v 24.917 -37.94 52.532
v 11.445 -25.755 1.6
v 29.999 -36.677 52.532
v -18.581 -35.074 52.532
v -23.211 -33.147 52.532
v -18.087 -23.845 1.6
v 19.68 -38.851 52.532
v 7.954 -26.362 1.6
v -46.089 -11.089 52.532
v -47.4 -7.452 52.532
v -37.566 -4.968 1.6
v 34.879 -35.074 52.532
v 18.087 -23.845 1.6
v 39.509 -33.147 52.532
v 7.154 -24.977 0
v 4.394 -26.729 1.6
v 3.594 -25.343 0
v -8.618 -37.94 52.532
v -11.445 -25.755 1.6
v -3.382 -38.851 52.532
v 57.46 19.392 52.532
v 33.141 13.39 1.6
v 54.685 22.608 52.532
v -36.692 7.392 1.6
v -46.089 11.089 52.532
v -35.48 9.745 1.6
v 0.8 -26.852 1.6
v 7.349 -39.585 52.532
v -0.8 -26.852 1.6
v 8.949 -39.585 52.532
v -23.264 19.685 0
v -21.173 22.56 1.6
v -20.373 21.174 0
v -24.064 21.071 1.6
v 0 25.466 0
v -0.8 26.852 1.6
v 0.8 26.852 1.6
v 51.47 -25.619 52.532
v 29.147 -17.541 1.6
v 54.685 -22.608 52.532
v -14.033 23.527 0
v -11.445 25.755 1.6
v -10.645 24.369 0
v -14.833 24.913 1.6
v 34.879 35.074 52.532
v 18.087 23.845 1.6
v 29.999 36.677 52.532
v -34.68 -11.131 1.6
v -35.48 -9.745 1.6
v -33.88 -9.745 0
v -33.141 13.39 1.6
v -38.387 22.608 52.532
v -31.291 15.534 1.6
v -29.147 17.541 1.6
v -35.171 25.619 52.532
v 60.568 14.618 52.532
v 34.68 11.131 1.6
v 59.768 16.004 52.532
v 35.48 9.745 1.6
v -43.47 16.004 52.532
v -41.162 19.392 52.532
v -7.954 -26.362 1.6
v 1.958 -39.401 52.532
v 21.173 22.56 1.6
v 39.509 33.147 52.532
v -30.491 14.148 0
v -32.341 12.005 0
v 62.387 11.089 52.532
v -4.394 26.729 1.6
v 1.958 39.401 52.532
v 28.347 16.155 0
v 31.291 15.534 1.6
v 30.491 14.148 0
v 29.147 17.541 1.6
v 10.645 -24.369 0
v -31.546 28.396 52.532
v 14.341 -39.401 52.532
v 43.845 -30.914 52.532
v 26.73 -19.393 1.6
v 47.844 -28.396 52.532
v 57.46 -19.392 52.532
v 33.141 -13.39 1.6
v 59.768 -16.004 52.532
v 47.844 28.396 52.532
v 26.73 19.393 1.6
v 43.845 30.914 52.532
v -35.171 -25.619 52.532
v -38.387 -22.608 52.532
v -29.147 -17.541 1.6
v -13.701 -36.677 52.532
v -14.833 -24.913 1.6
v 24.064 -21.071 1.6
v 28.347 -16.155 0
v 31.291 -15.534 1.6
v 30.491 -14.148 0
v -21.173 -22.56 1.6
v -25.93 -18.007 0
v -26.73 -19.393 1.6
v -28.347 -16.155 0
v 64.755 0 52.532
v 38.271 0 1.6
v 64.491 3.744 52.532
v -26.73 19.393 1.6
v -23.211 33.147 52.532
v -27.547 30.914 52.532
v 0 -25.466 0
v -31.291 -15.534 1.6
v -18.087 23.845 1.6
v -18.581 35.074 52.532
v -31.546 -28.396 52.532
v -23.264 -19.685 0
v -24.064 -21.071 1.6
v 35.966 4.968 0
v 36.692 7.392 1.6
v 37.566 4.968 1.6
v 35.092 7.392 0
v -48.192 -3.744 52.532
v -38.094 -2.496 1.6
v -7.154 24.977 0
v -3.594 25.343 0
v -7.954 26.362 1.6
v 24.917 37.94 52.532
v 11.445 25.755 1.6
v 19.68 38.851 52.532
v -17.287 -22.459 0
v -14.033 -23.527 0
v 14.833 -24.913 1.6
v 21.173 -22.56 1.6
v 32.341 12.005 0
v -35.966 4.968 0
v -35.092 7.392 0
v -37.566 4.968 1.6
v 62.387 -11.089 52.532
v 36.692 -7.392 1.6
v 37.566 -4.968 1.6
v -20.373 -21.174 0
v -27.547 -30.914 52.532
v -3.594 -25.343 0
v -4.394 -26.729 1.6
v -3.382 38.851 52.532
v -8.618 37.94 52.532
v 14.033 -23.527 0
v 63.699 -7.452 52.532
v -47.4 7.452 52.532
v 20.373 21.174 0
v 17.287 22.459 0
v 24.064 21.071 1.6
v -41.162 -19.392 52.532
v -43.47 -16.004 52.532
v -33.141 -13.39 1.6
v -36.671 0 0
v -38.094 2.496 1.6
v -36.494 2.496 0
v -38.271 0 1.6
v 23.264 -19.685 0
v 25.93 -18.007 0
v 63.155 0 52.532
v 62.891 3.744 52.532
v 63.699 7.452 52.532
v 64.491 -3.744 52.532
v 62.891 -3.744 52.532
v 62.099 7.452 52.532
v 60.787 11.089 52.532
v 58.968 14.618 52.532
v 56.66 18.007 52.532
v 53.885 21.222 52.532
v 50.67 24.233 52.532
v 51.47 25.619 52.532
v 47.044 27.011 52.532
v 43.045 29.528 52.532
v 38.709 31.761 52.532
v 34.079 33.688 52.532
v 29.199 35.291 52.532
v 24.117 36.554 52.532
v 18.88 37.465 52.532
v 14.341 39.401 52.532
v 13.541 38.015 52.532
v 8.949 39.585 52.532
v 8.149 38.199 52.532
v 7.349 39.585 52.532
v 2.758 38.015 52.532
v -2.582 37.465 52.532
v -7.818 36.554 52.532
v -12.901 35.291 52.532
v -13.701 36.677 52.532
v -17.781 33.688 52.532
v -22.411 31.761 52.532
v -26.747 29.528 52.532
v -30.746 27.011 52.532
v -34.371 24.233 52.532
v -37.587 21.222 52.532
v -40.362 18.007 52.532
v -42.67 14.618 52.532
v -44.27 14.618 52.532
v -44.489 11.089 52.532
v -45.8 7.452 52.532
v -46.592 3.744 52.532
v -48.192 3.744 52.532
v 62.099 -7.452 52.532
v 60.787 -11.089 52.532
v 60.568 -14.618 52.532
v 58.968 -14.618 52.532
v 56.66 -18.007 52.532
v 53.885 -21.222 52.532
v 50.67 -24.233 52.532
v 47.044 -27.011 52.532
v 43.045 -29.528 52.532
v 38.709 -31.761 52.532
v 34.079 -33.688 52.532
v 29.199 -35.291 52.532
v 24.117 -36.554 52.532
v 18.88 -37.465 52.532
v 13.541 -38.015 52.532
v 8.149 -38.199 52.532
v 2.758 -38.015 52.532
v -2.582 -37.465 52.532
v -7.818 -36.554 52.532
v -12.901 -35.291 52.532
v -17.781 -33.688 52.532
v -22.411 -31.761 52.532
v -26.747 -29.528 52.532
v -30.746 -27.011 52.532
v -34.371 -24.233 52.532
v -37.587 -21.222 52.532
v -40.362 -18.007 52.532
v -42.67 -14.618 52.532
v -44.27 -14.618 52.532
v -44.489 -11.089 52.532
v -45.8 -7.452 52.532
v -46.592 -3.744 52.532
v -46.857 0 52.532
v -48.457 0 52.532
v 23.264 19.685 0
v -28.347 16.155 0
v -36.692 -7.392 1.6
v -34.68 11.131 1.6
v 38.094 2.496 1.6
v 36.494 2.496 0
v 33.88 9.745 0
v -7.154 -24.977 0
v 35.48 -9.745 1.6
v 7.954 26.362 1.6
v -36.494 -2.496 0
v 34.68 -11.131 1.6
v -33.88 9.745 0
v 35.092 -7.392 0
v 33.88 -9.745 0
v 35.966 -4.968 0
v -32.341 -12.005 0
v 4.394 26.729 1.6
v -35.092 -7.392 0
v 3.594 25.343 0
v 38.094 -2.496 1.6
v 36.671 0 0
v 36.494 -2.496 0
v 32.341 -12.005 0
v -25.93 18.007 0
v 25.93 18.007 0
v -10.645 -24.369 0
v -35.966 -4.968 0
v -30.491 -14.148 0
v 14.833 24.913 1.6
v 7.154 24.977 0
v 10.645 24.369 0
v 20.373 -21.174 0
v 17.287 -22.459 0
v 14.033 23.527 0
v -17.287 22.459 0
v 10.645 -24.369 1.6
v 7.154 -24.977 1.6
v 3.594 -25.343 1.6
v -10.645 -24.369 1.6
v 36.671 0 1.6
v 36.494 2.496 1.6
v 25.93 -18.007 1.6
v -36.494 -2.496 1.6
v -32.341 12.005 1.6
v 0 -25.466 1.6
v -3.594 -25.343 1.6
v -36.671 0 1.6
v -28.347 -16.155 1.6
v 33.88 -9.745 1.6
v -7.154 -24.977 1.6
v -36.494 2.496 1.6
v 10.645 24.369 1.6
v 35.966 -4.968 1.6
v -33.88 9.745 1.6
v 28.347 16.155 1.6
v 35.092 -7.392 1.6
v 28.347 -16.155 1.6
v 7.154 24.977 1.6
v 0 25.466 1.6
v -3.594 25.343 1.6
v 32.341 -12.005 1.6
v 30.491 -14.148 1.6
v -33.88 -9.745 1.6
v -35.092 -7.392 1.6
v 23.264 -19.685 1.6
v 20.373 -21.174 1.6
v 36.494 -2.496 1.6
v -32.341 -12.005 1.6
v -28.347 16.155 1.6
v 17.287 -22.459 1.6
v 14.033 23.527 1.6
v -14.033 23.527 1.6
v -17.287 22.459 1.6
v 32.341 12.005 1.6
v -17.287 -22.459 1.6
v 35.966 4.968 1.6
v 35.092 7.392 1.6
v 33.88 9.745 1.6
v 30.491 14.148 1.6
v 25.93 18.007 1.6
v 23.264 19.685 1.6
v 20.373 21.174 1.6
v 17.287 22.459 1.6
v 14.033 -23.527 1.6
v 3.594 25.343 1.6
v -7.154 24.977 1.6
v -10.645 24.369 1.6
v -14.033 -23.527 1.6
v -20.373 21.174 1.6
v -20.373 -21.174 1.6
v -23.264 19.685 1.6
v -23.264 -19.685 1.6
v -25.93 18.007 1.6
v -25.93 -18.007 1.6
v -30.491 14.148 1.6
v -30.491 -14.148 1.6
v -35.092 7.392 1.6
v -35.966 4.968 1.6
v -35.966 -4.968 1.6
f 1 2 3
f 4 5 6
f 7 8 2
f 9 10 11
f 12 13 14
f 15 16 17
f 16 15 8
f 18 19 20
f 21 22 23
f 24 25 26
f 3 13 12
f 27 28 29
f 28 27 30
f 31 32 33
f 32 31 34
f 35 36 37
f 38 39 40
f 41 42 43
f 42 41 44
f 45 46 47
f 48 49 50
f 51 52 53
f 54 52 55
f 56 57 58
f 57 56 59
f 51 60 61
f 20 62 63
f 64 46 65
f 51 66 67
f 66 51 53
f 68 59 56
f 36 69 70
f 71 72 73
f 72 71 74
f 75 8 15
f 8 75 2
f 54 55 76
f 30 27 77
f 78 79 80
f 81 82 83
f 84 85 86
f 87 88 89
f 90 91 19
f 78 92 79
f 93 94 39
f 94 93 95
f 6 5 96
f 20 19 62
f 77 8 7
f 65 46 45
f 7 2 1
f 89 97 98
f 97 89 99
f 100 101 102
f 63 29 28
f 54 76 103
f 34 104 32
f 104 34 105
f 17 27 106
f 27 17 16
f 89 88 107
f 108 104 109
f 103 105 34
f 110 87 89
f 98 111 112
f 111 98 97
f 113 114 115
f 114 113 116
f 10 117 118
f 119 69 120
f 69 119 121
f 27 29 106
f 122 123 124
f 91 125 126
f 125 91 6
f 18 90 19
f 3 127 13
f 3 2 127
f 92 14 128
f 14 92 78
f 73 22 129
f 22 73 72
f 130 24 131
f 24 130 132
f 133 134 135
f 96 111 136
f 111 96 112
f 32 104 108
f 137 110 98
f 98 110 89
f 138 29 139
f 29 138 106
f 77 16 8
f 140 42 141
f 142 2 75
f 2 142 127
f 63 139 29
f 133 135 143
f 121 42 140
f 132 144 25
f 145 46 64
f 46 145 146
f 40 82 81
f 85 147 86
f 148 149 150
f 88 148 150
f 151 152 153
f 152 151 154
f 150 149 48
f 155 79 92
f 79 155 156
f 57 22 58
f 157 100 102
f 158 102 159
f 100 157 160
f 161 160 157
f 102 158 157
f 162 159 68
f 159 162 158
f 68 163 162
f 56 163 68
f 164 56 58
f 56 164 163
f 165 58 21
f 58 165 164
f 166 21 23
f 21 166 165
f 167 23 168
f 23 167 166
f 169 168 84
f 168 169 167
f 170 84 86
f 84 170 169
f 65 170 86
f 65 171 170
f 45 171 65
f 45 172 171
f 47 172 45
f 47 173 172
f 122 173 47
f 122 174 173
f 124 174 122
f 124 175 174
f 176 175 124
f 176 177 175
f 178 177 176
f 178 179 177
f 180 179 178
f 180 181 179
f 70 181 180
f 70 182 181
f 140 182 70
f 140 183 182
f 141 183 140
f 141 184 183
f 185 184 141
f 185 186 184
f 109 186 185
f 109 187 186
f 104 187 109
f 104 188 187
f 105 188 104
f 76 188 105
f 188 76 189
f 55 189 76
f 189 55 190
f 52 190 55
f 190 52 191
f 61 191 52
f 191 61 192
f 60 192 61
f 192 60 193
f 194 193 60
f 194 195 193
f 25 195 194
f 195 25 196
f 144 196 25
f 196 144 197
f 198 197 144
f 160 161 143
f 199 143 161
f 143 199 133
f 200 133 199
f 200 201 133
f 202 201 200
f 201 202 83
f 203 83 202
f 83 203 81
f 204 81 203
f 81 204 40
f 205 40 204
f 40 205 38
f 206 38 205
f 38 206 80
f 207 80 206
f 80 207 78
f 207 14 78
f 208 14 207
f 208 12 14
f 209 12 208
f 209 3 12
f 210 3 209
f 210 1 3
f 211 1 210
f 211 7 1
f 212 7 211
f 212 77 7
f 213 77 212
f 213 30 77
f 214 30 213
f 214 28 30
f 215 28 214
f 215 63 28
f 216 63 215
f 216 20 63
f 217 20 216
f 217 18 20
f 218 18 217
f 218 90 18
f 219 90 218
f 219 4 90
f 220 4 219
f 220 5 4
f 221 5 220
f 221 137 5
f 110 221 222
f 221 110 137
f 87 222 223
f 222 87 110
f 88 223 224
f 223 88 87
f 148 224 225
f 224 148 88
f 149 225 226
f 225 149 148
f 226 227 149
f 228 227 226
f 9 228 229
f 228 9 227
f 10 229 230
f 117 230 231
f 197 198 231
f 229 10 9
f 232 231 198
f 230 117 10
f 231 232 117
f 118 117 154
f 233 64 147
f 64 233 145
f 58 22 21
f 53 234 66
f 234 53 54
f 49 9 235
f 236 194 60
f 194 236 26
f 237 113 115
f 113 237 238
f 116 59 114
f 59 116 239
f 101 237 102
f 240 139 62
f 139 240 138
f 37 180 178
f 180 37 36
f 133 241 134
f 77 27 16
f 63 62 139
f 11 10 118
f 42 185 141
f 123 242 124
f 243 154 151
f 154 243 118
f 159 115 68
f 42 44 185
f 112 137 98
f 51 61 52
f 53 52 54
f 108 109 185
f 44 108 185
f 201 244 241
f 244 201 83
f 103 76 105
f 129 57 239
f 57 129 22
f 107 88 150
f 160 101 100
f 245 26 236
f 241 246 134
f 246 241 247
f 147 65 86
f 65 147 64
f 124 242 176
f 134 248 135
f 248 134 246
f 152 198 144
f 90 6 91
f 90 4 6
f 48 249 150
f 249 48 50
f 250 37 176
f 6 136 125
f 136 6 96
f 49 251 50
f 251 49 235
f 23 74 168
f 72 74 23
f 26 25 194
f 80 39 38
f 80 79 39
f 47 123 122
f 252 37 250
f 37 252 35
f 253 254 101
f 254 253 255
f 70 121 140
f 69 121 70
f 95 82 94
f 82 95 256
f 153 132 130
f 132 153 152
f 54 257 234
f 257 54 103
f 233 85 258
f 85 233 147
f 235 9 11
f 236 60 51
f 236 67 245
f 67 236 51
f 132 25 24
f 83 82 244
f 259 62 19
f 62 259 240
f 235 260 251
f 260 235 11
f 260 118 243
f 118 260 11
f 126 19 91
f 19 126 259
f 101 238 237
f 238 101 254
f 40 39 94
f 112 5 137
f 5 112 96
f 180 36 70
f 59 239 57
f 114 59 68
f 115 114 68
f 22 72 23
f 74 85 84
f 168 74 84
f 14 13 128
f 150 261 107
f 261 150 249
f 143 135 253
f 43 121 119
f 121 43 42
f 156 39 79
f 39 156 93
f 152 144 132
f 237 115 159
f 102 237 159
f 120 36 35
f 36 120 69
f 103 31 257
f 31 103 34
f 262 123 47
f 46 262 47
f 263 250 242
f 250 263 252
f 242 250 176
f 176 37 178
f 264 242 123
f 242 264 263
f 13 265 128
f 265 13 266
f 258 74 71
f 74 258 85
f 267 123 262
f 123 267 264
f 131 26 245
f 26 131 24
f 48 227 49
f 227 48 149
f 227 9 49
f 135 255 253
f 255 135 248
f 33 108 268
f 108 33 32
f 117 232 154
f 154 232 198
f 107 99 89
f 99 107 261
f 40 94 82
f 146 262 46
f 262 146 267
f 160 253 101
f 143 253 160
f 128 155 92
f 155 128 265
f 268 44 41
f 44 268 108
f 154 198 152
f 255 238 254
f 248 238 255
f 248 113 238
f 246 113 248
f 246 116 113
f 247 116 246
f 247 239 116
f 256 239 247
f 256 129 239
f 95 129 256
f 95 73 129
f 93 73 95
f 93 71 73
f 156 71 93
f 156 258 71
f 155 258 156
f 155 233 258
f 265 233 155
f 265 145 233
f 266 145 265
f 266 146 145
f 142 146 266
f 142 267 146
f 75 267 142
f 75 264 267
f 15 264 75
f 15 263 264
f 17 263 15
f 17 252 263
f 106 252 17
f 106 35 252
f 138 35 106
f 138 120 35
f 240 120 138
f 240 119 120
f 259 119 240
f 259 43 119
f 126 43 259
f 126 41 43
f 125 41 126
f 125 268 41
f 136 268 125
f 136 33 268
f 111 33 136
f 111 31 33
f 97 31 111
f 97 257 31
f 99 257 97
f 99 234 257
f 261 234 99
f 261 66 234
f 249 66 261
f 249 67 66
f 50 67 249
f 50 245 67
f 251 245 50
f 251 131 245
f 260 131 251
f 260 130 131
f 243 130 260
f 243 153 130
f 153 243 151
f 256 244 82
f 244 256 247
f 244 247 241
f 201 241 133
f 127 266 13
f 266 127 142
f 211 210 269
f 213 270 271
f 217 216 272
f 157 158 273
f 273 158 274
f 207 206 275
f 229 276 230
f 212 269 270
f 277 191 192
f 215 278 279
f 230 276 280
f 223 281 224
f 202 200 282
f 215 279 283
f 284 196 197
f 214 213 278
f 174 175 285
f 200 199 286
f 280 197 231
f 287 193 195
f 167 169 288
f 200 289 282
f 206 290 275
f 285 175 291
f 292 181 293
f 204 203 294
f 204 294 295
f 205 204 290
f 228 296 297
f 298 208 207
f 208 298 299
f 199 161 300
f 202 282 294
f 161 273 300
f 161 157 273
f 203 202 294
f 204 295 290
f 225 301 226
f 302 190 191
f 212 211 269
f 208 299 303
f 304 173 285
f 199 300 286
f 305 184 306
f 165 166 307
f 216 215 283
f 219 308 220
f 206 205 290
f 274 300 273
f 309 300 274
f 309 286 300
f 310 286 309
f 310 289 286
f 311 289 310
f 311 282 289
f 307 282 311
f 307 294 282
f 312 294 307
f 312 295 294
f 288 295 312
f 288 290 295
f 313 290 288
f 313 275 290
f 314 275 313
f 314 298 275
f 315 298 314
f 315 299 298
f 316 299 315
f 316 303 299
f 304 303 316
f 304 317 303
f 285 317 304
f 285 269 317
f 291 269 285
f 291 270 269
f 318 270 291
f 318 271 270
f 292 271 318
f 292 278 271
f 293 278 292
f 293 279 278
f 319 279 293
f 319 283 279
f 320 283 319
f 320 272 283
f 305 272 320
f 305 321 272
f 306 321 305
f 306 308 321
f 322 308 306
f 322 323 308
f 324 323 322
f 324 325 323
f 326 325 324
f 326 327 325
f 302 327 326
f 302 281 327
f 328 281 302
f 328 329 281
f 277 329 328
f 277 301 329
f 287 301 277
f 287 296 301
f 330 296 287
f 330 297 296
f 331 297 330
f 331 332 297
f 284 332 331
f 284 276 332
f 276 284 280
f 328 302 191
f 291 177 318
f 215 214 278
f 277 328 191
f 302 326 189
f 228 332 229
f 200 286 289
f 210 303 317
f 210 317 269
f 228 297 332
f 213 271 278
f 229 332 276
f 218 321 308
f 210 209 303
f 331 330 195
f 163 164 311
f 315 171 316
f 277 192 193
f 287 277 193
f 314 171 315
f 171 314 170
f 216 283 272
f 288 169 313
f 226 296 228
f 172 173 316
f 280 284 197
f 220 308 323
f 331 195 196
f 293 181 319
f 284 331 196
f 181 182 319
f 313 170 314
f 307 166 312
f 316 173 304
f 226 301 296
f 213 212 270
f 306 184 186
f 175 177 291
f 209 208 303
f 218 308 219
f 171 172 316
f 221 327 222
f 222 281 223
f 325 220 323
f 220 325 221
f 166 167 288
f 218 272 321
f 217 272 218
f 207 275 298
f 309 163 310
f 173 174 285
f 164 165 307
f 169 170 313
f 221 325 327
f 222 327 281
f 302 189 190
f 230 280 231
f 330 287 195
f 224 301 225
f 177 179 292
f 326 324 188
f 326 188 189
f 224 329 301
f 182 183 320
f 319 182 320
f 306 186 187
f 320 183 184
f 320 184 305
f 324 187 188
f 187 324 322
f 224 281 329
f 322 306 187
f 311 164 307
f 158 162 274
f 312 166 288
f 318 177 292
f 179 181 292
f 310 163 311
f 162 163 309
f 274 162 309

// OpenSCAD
//Code by Griffin Nicoll 2012

//Stuff to edit! volume is summed so only add what you want
cups = 1;
tbsp = 0;
tsp = 0;
mL = 0;
wall = 1.6; //wall thickness

//stuff you don't need to edit
sq = 1.2; //squeeze
sh = 0.16; //shear
pi = 3.14159;
volume = cups*236588+tbsp*14787+tsp*4929+1000*mL;//mm^3

difference(){
	minkowski(){
		cylinder(r1=0,r2=wall,h=wall,$fn=6);
		cupBase(volume);
	}
	translate([0,0,wall])cupBase(volume);
}
module cupBase(volume){
	x = pow(volume/(570*pi),1/3);
	multmatrix(m=[
		[sq, 0, sh, 0],
		[0, 1/sq, 0, 0],
		[0, 0, 1, 0],
		[0, 0, 0,  1]])
	cylinder(h=10*x,r1=6*x,r2=9*x,$fn=64);
}
